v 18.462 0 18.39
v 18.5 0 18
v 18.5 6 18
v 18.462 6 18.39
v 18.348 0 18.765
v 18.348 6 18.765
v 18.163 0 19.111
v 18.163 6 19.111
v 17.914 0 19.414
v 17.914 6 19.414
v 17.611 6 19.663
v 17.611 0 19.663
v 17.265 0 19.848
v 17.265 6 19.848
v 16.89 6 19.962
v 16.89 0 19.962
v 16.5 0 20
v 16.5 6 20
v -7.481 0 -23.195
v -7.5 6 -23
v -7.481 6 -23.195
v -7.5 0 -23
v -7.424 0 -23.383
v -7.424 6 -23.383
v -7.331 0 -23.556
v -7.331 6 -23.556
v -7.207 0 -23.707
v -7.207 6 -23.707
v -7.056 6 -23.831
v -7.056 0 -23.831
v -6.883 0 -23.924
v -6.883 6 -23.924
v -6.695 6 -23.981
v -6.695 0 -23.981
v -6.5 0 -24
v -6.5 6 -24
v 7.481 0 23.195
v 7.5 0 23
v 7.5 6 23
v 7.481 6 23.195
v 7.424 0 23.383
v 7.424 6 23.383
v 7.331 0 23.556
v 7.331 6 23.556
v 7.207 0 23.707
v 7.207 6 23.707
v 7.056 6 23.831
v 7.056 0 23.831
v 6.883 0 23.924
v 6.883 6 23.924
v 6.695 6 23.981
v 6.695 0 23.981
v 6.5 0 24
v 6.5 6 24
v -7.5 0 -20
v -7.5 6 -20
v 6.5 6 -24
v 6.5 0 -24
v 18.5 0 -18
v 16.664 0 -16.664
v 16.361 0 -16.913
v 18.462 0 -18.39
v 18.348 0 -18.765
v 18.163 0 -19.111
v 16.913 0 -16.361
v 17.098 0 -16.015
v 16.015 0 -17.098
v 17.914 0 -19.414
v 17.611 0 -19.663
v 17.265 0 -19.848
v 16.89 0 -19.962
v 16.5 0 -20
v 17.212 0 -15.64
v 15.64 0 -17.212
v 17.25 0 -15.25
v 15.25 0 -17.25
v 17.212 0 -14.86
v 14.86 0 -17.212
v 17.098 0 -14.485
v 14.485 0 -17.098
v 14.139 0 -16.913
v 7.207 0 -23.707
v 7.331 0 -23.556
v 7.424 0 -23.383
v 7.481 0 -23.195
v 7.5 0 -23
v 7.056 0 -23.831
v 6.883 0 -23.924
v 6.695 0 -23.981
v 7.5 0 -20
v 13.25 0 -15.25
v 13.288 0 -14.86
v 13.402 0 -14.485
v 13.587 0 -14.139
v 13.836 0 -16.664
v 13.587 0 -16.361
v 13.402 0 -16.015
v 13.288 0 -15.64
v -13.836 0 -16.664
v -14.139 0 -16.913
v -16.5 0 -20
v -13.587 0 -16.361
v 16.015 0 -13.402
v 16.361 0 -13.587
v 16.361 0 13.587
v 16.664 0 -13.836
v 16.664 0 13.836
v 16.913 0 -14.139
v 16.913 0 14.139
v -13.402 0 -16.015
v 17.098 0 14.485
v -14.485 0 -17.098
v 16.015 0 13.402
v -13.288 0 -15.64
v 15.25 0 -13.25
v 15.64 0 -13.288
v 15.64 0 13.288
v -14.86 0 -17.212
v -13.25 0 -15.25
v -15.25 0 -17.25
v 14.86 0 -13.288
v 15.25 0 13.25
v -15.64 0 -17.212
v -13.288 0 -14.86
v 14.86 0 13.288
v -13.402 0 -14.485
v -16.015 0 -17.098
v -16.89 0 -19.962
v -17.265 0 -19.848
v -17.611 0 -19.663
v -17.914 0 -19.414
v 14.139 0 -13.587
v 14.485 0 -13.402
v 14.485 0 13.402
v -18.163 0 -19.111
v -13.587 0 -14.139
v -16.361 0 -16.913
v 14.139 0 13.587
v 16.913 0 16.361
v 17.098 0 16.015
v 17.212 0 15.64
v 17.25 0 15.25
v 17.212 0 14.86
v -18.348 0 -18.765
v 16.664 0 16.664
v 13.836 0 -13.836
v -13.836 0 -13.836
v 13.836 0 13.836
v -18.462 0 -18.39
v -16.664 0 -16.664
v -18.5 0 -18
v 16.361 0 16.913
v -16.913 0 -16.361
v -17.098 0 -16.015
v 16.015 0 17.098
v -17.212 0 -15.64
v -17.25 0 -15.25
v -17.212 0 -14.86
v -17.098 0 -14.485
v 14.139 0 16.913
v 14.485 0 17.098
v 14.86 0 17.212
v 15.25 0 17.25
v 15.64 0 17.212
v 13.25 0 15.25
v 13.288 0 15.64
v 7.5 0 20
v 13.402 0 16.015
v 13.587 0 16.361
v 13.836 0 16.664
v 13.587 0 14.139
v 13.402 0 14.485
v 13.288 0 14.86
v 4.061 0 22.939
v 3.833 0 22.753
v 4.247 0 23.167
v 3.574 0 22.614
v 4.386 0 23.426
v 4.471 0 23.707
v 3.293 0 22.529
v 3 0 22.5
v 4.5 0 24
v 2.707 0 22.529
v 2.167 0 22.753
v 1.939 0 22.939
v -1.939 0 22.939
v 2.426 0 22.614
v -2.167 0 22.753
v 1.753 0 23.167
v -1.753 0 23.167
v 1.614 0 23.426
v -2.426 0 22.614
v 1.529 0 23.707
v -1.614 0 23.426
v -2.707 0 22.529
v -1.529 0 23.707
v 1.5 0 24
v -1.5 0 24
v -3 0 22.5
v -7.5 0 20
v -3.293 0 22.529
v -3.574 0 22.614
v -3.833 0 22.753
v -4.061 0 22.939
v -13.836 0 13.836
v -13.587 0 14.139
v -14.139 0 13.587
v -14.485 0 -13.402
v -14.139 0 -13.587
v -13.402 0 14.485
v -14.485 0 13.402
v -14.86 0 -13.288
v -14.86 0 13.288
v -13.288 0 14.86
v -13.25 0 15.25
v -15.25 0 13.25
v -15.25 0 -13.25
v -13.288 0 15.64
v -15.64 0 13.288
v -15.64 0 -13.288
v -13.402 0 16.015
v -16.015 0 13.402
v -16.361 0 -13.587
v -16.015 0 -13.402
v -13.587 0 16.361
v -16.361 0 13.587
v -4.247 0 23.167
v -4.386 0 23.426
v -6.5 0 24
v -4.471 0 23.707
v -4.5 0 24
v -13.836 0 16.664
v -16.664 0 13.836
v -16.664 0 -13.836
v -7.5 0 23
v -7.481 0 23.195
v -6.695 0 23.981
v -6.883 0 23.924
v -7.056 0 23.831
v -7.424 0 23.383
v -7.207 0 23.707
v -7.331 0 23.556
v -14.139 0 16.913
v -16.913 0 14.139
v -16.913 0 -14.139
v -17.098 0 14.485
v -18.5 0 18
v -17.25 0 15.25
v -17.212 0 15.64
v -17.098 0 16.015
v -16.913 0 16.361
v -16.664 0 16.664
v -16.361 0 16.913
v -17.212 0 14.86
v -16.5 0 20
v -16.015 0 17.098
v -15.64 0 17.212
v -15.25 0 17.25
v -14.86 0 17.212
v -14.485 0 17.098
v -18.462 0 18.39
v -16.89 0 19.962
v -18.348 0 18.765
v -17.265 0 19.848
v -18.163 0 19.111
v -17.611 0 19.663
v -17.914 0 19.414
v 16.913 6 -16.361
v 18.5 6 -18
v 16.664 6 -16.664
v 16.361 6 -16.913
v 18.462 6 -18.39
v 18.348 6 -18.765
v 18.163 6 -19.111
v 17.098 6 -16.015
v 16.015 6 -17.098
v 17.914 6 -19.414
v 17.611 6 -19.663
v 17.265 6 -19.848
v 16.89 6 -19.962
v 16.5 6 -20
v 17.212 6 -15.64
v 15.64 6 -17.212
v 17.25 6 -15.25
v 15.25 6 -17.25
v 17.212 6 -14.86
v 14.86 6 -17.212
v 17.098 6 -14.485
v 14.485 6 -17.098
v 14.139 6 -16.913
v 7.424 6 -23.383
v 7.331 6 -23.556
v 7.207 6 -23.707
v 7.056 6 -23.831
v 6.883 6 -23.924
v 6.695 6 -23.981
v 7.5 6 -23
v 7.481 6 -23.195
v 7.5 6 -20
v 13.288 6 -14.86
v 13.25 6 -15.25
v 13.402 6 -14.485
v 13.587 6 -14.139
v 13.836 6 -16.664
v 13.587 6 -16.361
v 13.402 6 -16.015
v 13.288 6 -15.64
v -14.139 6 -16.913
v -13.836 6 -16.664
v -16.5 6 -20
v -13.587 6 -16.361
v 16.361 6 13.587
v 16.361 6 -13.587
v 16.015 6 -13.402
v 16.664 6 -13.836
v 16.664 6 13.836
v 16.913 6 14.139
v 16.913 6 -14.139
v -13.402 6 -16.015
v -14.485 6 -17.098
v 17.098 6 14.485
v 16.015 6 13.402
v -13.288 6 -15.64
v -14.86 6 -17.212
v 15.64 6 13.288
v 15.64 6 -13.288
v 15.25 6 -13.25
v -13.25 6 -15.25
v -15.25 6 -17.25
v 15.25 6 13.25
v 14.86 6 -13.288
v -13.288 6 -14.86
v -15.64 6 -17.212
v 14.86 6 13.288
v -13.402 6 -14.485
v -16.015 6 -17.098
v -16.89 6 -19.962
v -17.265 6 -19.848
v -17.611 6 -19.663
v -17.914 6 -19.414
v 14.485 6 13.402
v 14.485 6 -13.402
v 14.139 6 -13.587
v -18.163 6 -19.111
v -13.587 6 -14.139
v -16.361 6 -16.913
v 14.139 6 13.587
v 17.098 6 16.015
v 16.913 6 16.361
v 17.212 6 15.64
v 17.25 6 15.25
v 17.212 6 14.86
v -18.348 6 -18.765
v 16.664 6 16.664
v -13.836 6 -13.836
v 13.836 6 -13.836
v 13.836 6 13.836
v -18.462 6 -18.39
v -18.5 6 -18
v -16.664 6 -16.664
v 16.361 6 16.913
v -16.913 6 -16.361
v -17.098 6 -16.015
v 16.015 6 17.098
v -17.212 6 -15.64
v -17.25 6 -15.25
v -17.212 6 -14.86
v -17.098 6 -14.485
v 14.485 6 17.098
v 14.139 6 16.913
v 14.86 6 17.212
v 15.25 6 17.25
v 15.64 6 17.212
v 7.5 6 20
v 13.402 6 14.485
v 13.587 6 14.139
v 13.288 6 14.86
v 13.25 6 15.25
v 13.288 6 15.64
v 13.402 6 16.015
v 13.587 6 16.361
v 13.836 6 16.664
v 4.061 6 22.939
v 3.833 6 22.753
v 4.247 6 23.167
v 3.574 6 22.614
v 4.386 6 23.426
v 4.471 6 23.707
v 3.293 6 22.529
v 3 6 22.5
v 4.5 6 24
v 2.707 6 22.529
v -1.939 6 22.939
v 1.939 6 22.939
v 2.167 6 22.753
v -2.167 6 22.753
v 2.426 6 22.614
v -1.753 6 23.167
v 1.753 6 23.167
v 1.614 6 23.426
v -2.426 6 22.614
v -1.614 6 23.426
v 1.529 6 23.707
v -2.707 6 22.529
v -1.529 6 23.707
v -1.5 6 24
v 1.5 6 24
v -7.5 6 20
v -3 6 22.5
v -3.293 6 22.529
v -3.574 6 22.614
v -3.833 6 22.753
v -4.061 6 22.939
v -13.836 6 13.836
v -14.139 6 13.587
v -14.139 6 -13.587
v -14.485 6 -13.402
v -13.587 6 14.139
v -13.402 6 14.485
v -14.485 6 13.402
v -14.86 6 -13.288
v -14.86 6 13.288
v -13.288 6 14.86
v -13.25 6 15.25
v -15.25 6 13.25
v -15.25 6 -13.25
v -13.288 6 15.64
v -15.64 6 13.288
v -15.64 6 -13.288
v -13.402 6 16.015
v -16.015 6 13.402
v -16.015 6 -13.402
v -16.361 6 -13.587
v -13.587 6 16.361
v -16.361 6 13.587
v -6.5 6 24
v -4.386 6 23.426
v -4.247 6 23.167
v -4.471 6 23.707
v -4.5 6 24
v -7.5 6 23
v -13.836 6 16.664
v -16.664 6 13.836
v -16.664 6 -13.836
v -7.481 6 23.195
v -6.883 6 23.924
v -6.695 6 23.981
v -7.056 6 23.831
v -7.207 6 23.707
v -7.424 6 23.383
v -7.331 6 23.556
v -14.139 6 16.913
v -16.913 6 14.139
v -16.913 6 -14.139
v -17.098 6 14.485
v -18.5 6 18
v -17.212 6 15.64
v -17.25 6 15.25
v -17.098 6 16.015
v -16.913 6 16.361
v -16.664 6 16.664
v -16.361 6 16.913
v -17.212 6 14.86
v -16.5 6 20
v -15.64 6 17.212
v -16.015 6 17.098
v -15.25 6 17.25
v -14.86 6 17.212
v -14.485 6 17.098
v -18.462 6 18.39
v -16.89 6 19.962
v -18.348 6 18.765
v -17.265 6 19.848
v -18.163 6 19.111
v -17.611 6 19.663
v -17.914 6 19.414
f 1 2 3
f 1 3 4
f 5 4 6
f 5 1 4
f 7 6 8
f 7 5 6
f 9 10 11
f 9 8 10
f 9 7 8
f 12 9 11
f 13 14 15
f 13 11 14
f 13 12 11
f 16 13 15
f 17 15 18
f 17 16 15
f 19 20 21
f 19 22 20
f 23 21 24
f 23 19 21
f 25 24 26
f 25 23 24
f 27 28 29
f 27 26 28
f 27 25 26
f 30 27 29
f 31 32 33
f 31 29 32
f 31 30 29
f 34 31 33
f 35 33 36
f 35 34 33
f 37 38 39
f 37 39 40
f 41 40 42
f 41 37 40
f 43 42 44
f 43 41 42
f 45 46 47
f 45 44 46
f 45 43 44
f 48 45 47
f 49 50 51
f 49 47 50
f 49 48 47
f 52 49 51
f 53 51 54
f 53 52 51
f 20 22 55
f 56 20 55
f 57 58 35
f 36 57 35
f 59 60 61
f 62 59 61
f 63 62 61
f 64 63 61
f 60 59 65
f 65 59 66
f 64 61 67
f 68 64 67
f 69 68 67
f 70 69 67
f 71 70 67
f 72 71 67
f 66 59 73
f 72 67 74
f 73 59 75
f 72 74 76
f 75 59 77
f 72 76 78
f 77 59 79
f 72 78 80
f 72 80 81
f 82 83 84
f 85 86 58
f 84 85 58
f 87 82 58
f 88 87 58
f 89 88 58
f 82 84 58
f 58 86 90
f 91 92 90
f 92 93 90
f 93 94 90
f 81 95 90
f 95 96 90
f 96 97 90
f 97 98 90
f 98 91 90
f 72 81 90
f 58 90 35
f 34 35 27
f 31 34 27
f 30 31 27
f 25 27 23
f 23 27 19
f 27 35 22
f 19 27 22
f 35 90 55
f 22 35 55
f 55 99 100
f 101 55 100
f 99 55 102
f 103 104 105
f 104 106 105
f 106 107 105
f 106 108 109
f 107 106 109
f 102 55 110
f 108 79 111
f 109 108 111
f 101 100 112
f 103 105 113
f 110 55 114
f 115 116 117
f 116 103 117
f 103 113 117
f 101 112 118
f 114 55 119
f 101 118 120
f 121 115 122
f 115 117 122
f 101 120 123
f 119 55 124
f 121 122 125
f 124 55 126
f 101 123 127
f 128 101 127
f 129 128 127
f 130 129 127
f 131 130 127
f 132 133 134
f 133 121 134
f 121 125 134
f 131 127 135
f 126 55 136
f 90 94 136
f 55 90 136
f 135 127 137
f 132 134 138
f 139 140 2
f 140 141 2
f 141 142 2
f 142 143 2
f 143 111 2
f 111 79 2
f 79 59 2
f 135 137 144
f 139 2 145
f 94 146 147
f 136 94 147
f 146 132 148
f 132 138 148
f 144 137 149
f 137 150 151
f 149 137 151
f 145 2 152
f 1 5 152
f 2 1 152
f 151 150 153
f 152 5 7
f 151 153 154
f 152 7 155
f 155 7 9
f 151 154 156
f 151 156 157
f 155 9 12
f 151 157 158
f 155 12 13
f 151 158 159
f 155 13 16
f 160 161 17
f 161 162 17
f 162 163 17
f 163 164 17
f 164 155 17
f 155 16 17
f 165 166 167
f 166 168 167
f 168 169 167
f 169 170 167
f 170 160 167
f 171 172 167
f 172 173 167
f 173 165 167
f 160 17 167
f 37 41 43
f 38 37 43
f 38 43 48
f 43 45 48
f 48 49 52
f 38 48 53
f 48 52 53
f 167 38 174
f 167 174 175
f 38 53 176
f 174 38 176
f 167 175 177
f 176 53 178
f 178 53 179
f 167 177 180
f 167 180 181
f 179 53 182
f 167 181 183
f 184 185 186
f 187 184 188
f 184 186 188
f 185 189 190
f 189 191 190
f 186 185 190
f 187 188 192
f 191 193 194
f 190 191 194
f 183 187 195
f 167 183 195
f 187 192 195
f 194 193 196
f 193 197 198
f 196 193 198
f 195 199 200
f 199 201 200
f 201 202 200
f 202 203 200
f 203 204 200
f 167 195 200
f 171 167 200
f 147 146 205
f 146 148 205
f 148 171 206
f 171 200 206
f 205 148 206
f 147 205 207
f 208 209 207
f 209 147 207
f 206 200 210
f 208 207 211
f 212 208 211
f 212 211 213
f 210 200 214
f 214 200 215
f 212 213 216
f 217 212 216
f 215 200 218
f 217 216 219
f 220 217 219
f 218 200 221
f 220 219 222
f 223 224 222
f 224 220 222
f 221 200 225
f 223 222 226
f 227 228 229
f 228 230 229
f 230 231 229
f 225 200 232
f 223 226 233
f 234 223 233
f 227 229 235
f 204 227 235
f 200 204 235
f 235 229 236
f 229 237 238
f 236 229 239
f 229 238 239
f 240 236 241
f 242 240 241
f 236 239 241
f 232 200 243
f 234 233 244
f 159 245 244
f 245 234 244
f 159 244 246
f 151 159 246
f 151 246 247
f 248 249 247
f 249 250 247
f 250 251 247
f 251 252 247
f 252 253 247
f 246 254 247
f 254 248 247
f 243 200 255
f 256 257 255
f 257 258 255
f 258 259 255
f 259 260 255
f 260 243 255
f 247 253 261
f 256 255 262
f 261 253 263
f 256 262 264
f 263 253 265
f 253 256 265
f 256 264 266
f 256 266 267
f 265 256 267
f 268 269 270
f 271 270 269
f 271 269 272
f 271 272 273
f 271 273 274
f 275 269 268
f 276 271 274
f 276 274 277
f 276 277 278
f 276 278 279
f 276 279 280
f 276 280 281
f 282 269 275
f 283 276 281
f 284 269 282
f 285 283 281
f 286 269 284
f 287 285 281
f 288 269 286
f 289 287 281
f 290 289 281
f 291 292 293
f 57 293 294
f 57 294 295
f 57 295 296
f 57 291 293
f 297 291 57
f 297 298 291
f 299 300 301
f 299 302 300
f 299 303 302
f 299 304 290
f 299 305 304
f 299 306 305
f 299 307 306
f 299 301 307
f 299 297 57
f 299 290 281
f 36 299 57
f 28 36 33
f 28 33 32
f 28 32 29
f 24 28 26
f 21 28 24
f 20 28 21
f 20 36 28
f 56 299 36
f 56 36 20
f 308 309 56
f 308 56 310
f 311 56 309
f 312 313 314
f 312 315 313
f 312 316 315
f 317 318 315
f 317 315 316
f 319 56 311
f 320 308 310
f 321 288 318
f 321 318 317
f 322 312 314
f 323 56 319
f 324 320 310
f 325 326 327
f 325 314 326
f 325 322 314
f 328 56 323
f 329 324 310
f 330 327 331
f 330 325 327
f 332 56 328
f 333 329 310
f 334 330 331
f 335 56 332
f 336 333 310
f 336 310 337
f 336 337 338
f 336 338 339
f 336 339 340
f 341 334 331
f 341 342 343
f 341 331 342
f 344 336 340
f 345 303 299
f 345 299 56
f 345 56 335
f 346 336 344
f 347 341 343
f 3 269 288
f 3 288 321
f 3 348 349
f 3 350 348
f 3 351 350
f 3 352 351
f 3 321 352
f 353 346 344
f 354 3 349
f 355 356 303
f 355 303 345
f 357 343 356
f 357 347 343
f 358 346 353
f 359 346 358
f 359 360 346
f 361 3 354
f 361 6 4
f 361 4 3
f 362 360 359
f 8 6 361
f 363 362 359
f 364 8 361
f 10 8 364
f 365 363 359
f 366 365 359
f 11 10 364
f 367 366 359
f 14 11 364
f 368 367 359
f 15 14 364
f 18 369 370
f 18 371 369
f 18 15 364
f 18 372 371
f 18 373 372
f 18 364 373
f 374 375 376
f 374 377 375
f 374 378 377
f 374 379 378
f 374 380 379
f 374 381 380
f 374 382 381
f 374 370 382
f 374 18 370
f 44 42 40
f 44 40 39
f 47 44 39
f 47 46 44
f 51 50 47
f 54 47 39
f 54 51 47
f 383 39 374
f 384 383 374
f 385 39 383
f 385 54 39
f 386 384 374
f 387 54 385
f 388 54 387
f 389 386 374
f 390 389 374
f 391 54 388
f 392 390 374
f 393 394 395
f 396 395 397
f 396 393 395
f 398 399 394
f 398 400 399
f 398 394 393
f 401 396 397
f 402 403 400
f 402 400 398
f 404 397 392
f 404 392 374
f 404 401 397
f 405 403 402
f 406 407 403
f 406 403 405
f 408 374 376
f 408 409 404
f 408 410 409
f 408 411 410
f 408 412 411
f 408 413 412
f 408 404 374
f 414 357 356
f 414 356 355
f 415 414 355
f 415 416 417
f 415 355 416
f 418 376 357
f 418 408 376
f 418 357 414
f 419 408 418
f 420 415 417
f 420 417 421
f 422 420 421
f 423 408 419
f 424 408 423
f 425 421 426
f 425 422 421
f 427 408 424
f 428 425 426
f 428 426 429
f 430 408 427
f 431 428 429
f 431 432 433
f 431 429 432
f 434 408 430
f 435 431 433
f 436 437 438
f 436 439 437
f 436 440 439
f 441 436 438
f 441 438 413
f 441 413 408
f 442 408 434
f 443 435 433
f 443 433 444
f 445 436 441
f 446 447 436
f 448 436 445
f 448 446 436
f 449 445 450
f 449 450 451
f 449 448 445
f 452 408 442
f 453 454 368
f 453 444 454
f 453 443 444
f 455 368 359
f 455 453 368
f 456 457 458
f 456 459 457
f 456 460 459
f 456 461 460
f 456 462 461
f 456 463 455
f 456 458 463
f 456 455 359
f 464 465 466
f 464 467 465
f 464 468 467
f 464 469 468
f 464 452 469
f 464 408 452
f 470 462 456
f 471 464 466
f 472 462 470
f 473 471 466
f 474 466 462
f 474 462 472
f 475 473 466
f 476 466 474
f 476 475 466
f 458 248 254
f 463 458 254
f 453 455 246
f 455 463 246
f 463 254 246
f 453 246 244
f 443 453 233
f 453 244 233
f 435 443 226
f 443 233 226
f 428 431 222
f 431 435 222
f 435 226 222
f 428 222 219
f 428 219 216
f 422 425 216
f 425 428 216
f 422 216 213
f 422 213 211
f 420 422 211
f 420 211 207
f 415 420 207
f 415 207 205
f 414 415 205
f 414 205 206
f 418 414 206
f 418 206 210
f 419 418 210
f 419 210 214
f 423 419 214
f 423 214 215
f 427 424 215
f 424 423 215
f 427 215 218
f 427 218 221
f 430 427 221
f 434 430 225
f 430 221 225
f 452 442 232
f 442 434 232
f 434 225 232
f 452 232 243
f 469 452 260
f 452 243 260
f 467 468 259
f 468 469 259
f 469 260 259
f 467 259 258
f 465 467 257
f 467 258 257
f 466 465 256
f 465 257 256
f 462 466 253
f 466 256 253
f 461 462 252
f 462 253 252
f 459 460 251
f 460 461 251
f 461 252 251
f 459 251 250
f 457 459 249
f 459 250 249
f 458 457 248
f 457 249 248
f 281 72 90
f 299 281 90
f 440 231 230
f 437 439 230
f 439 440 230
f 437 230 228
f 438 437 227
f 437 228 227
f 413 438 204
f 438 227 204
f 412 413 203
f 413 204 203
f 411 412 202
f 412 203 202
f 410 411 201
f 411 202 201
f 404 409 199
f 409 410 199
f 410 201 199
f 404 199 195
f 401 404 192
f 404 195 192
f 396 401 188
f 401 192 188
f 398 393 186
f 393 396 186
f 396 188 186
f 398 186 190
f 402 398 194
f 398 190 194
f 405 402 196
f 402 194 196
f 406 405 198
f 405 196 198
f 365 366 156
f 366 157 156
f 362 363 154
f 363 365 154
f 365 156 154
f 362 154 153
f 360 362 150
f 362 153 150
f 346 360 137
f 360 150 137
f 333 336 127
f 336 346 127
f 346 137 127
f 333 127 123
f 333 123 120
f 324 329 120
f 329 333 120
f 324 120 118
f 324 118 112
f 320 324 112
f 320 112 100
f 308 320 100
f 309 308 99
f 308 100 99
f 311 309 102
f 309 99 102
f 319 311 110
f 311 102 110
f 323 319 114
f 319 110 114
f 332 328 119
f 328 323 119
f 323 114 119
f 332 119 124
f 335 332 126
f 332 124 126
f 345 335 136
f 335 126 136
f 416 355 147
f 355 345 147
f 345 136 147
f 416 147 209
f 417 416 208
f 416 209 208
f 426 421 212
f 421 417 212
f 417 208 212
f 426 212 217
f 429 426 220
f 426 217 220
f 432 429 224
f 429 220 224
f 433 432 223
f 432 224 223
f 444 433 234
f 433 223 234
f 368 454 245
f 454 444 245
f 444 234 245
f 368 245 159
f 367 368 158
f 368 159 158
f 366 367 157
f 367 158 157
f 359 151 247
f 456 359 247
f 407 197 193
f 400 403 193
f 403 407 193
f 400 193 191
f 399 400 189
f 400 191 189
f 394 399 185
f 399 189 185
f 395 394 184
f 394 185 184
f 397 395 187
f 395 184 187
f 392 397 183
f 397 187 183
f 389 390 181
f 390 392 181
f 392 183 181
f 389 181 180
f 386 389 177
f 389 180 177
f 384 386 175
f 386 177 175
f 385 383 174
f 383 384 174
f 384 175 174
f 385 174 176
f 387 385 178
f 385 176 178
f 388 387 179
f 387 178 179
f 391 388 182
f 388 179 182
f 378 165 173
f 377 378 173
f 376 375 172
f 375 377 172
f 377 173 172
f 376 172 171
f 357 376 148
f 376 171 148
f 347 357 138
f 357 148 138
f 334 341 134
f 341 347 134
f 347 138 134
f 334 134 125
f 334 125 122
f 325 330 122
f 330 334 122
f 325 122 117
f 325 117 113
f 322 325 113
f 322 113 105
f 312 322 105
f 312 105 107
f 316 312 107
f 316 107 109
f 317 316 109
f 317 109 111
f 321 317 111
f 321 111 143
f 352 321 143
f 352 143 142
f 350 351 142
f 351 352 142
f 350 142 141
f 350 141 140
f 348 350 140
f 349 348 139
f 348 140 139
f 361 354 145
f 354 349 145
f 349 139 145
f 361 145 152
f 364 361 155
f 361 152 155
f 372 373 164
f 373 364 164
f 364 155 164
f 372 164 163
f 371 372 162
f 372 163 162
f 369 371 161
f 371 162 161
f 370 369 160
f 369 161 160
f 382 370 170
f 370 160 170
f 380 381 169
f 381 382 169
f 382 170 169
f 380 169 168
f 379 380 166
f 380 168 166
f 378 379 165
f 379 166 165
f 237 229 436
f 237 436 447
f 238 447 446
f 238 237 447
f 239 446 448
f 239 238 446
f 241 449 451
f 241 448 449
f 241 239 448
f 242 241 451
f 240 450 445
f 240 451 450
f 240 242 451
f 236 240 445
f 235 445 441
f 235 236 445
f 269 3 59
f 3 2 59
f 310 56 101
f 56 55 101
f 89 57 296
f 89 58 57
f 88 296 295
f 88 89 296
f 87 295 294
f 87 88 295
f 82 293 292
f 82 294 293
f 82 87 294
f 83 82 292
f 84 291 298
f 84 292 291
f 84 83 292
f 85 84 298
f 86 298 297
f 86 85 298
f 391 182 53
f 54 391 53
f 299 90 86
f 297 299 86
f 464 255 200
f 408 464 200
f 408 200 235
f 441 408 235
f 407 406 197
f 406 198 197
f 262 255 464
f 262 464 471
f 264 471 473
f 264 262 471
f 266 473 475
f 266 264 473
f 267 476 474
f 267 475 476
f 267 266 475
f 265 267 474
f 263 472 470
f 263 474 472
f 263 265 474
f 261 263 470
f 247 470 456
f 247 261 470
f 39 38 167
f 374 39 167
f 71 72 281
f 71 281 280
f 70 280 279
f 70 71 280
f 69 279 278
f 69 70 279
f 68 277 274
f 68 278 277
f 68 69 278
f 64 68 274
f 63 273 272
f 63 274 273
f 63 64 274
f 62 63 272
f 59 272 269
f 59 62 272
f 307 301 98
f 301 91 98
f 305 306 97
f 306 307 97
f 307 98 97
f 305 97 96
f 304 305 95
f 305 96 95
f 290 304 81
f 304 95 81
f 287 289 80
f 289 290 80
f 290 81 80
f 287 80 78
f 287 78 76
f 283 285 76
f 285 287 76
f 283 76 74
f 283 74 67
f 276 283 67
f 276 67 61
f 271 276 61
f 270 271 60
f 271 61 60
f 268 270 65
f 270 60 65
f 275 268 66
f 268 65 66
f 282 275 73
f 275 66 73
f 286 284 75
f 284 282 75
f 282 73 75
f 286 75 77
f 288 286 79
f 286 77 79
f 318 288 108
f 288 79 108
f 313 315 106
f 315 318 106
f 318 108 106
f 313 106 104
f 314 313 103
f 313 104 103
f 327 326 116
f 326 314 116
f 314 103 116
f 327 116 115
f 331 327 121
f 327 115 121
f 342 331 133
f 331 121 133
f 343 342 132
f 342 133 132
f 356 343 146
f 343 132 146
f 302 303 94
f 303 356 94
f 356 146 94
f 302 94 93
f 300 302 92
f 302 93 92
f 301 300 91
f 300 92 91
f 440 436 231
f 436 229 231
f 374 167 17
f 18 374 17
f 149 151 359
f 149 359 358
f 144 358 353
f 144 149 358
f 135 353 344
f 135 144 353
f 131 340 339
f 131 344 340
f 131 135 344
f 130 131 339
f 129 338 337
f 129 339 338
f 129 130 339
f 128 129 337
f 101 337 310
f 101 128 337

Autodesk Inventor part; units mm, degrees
ref_plane "YZ Plane" through (0, 0, 0) normal (1, 0, 0) x (0, 1, 0)
ref_plane "XZ Plane" through (0, 0, 0) normal (0, 1, 0) x (-1, 0, 0)
ref_plane "XY Plane" through (0, 0, 0) normal (0, 0, 1) x (1, 0, 0)
sketch "Sketch1" plane through (0, 0, 0) normal (0, 1, 0) x (-1, 0, 0)
  line L0 (16.5, 20) -> (-16.5, 20)
  line L1 (-18.5, 18) -> (-18.5, -18)
  line L2 (-16.5, -20) -> (16.5, -20)
  line L3 (18.5, -18) -> (18.5, 18)
  arc A0 (18.5, 18) -> (16.5, 20) centre (16.5, 18) ccw
  arc A1 (16.5, -20) -> (18.5, -18) centre (16.5, -18) ccw
  arc A2 (-16.5, 20) -> (-18.5, 18) centre (-16.5, 18) ccw
  arc A3 (-18.5, -18) -> (-16.5, -20) centre (-16.5, -18) ccw
  line L4 (6.5, 24) -> (-6.5, 24)
  line L5 (-7.5, 23) -> (-7.5, 20)
  line L6 (-7.5, 20) -> (7.5, 20)
  line L7 (7.5, 20) -> (7.5, 23)
  line L8 (7.5, -20) -> (-7.5, -20)
  line L9 (-7.5, -20) -> (-7.5, -23)
  line L10 (-6.5, -24) -> (6.5, -24)
  line L11 (7.5, -23) -> (7.5, -20)
  arc A4 (7.5, 23) -> (6.5, 24) centre (6.5, 23) ccw
  arc A5 (-6.5, 24) -> (-7.5, 23) centre (-6.5, 23) ccw
  arc A6 (-7.5, -23) -> (-6.5, -24) centre (-6.5, -23) ccw
  arc A7 (6.5, -24) -> (7.5, -23) centre (6.5, -23) ccw
  circle A8 centre (3, 24) radius 1.5
  circle A9 centre (-3, 24) radius 1.5
  circle A10 centre (15.25, 15.25) radius 2
  circle A11 centre (15.25, -15.25) radius 2
  circle A12 centre (-15.25, -15.25) radius 2
  circle A13 centre (-15.25, 15.25) radius 2
  point P0 (0, 0)
  point P1 (-18.5, -20)
  point P2 (-18.5, 20)
  point P3 (18.5, -20)
  point P4 (-7.5, 24)
  point P5 (-7.5, -24)
  point P6 (7.5, -24)
  point P7 (0, 20)
  point P8 (0, -20)
  point P9 (4.5, 24)
  point P10 (1.5, 24)
  point P11 (-1.5, 24)
  point P12 (-4.5, 24)
  dimension "d0" = 37
  dimension "d1" = 40
  dimension "d2" = 20
  dimension "d3" = 18.5
  dimension "d4" = 2
  dimension "d5" = 15
  dimension "d6" = 4
  dimension "d7" = 15
  dimension "d8" = 4
  dimension "d9" = 1
  dimension "d10" = 3
  dimension "d11" = 3
  dimension "d12" = 3
  dimension "d13" = 6
  dimension "d14" = 4
  dimension "d15" = 4
  dimension "d16" = 4
  dimension "d17" = 4
  dimension "d18" = 30.5
  dimension "d19" = 30.5
  dimension "d20" = 30.5
  dimension "d21" = 30.5
  dimension "d22" = 3.25
  dimension "d23" = 4.75
extrude "Extrusion1" add sketch "Sketch1" along normal blind 6 contours A0 L3 A1 L2 A3 L1 A2 L0 | L0 L5 A5 L4 A9 A8 A4 L7 | L11 A7 L10 A6 L9 L2
equation "\"d2\" = 0.5 * d1"
equation "\"d3\" = 0.5 * d0"
equation "\"d22\" = -0.5 * d20 + 0.5 * d0"
equation "\"d23\" = -0.5 * d19 + 0.5 * d1"
properties part number "Holybro Tekko ESC model" material "PMMA Plastic"
